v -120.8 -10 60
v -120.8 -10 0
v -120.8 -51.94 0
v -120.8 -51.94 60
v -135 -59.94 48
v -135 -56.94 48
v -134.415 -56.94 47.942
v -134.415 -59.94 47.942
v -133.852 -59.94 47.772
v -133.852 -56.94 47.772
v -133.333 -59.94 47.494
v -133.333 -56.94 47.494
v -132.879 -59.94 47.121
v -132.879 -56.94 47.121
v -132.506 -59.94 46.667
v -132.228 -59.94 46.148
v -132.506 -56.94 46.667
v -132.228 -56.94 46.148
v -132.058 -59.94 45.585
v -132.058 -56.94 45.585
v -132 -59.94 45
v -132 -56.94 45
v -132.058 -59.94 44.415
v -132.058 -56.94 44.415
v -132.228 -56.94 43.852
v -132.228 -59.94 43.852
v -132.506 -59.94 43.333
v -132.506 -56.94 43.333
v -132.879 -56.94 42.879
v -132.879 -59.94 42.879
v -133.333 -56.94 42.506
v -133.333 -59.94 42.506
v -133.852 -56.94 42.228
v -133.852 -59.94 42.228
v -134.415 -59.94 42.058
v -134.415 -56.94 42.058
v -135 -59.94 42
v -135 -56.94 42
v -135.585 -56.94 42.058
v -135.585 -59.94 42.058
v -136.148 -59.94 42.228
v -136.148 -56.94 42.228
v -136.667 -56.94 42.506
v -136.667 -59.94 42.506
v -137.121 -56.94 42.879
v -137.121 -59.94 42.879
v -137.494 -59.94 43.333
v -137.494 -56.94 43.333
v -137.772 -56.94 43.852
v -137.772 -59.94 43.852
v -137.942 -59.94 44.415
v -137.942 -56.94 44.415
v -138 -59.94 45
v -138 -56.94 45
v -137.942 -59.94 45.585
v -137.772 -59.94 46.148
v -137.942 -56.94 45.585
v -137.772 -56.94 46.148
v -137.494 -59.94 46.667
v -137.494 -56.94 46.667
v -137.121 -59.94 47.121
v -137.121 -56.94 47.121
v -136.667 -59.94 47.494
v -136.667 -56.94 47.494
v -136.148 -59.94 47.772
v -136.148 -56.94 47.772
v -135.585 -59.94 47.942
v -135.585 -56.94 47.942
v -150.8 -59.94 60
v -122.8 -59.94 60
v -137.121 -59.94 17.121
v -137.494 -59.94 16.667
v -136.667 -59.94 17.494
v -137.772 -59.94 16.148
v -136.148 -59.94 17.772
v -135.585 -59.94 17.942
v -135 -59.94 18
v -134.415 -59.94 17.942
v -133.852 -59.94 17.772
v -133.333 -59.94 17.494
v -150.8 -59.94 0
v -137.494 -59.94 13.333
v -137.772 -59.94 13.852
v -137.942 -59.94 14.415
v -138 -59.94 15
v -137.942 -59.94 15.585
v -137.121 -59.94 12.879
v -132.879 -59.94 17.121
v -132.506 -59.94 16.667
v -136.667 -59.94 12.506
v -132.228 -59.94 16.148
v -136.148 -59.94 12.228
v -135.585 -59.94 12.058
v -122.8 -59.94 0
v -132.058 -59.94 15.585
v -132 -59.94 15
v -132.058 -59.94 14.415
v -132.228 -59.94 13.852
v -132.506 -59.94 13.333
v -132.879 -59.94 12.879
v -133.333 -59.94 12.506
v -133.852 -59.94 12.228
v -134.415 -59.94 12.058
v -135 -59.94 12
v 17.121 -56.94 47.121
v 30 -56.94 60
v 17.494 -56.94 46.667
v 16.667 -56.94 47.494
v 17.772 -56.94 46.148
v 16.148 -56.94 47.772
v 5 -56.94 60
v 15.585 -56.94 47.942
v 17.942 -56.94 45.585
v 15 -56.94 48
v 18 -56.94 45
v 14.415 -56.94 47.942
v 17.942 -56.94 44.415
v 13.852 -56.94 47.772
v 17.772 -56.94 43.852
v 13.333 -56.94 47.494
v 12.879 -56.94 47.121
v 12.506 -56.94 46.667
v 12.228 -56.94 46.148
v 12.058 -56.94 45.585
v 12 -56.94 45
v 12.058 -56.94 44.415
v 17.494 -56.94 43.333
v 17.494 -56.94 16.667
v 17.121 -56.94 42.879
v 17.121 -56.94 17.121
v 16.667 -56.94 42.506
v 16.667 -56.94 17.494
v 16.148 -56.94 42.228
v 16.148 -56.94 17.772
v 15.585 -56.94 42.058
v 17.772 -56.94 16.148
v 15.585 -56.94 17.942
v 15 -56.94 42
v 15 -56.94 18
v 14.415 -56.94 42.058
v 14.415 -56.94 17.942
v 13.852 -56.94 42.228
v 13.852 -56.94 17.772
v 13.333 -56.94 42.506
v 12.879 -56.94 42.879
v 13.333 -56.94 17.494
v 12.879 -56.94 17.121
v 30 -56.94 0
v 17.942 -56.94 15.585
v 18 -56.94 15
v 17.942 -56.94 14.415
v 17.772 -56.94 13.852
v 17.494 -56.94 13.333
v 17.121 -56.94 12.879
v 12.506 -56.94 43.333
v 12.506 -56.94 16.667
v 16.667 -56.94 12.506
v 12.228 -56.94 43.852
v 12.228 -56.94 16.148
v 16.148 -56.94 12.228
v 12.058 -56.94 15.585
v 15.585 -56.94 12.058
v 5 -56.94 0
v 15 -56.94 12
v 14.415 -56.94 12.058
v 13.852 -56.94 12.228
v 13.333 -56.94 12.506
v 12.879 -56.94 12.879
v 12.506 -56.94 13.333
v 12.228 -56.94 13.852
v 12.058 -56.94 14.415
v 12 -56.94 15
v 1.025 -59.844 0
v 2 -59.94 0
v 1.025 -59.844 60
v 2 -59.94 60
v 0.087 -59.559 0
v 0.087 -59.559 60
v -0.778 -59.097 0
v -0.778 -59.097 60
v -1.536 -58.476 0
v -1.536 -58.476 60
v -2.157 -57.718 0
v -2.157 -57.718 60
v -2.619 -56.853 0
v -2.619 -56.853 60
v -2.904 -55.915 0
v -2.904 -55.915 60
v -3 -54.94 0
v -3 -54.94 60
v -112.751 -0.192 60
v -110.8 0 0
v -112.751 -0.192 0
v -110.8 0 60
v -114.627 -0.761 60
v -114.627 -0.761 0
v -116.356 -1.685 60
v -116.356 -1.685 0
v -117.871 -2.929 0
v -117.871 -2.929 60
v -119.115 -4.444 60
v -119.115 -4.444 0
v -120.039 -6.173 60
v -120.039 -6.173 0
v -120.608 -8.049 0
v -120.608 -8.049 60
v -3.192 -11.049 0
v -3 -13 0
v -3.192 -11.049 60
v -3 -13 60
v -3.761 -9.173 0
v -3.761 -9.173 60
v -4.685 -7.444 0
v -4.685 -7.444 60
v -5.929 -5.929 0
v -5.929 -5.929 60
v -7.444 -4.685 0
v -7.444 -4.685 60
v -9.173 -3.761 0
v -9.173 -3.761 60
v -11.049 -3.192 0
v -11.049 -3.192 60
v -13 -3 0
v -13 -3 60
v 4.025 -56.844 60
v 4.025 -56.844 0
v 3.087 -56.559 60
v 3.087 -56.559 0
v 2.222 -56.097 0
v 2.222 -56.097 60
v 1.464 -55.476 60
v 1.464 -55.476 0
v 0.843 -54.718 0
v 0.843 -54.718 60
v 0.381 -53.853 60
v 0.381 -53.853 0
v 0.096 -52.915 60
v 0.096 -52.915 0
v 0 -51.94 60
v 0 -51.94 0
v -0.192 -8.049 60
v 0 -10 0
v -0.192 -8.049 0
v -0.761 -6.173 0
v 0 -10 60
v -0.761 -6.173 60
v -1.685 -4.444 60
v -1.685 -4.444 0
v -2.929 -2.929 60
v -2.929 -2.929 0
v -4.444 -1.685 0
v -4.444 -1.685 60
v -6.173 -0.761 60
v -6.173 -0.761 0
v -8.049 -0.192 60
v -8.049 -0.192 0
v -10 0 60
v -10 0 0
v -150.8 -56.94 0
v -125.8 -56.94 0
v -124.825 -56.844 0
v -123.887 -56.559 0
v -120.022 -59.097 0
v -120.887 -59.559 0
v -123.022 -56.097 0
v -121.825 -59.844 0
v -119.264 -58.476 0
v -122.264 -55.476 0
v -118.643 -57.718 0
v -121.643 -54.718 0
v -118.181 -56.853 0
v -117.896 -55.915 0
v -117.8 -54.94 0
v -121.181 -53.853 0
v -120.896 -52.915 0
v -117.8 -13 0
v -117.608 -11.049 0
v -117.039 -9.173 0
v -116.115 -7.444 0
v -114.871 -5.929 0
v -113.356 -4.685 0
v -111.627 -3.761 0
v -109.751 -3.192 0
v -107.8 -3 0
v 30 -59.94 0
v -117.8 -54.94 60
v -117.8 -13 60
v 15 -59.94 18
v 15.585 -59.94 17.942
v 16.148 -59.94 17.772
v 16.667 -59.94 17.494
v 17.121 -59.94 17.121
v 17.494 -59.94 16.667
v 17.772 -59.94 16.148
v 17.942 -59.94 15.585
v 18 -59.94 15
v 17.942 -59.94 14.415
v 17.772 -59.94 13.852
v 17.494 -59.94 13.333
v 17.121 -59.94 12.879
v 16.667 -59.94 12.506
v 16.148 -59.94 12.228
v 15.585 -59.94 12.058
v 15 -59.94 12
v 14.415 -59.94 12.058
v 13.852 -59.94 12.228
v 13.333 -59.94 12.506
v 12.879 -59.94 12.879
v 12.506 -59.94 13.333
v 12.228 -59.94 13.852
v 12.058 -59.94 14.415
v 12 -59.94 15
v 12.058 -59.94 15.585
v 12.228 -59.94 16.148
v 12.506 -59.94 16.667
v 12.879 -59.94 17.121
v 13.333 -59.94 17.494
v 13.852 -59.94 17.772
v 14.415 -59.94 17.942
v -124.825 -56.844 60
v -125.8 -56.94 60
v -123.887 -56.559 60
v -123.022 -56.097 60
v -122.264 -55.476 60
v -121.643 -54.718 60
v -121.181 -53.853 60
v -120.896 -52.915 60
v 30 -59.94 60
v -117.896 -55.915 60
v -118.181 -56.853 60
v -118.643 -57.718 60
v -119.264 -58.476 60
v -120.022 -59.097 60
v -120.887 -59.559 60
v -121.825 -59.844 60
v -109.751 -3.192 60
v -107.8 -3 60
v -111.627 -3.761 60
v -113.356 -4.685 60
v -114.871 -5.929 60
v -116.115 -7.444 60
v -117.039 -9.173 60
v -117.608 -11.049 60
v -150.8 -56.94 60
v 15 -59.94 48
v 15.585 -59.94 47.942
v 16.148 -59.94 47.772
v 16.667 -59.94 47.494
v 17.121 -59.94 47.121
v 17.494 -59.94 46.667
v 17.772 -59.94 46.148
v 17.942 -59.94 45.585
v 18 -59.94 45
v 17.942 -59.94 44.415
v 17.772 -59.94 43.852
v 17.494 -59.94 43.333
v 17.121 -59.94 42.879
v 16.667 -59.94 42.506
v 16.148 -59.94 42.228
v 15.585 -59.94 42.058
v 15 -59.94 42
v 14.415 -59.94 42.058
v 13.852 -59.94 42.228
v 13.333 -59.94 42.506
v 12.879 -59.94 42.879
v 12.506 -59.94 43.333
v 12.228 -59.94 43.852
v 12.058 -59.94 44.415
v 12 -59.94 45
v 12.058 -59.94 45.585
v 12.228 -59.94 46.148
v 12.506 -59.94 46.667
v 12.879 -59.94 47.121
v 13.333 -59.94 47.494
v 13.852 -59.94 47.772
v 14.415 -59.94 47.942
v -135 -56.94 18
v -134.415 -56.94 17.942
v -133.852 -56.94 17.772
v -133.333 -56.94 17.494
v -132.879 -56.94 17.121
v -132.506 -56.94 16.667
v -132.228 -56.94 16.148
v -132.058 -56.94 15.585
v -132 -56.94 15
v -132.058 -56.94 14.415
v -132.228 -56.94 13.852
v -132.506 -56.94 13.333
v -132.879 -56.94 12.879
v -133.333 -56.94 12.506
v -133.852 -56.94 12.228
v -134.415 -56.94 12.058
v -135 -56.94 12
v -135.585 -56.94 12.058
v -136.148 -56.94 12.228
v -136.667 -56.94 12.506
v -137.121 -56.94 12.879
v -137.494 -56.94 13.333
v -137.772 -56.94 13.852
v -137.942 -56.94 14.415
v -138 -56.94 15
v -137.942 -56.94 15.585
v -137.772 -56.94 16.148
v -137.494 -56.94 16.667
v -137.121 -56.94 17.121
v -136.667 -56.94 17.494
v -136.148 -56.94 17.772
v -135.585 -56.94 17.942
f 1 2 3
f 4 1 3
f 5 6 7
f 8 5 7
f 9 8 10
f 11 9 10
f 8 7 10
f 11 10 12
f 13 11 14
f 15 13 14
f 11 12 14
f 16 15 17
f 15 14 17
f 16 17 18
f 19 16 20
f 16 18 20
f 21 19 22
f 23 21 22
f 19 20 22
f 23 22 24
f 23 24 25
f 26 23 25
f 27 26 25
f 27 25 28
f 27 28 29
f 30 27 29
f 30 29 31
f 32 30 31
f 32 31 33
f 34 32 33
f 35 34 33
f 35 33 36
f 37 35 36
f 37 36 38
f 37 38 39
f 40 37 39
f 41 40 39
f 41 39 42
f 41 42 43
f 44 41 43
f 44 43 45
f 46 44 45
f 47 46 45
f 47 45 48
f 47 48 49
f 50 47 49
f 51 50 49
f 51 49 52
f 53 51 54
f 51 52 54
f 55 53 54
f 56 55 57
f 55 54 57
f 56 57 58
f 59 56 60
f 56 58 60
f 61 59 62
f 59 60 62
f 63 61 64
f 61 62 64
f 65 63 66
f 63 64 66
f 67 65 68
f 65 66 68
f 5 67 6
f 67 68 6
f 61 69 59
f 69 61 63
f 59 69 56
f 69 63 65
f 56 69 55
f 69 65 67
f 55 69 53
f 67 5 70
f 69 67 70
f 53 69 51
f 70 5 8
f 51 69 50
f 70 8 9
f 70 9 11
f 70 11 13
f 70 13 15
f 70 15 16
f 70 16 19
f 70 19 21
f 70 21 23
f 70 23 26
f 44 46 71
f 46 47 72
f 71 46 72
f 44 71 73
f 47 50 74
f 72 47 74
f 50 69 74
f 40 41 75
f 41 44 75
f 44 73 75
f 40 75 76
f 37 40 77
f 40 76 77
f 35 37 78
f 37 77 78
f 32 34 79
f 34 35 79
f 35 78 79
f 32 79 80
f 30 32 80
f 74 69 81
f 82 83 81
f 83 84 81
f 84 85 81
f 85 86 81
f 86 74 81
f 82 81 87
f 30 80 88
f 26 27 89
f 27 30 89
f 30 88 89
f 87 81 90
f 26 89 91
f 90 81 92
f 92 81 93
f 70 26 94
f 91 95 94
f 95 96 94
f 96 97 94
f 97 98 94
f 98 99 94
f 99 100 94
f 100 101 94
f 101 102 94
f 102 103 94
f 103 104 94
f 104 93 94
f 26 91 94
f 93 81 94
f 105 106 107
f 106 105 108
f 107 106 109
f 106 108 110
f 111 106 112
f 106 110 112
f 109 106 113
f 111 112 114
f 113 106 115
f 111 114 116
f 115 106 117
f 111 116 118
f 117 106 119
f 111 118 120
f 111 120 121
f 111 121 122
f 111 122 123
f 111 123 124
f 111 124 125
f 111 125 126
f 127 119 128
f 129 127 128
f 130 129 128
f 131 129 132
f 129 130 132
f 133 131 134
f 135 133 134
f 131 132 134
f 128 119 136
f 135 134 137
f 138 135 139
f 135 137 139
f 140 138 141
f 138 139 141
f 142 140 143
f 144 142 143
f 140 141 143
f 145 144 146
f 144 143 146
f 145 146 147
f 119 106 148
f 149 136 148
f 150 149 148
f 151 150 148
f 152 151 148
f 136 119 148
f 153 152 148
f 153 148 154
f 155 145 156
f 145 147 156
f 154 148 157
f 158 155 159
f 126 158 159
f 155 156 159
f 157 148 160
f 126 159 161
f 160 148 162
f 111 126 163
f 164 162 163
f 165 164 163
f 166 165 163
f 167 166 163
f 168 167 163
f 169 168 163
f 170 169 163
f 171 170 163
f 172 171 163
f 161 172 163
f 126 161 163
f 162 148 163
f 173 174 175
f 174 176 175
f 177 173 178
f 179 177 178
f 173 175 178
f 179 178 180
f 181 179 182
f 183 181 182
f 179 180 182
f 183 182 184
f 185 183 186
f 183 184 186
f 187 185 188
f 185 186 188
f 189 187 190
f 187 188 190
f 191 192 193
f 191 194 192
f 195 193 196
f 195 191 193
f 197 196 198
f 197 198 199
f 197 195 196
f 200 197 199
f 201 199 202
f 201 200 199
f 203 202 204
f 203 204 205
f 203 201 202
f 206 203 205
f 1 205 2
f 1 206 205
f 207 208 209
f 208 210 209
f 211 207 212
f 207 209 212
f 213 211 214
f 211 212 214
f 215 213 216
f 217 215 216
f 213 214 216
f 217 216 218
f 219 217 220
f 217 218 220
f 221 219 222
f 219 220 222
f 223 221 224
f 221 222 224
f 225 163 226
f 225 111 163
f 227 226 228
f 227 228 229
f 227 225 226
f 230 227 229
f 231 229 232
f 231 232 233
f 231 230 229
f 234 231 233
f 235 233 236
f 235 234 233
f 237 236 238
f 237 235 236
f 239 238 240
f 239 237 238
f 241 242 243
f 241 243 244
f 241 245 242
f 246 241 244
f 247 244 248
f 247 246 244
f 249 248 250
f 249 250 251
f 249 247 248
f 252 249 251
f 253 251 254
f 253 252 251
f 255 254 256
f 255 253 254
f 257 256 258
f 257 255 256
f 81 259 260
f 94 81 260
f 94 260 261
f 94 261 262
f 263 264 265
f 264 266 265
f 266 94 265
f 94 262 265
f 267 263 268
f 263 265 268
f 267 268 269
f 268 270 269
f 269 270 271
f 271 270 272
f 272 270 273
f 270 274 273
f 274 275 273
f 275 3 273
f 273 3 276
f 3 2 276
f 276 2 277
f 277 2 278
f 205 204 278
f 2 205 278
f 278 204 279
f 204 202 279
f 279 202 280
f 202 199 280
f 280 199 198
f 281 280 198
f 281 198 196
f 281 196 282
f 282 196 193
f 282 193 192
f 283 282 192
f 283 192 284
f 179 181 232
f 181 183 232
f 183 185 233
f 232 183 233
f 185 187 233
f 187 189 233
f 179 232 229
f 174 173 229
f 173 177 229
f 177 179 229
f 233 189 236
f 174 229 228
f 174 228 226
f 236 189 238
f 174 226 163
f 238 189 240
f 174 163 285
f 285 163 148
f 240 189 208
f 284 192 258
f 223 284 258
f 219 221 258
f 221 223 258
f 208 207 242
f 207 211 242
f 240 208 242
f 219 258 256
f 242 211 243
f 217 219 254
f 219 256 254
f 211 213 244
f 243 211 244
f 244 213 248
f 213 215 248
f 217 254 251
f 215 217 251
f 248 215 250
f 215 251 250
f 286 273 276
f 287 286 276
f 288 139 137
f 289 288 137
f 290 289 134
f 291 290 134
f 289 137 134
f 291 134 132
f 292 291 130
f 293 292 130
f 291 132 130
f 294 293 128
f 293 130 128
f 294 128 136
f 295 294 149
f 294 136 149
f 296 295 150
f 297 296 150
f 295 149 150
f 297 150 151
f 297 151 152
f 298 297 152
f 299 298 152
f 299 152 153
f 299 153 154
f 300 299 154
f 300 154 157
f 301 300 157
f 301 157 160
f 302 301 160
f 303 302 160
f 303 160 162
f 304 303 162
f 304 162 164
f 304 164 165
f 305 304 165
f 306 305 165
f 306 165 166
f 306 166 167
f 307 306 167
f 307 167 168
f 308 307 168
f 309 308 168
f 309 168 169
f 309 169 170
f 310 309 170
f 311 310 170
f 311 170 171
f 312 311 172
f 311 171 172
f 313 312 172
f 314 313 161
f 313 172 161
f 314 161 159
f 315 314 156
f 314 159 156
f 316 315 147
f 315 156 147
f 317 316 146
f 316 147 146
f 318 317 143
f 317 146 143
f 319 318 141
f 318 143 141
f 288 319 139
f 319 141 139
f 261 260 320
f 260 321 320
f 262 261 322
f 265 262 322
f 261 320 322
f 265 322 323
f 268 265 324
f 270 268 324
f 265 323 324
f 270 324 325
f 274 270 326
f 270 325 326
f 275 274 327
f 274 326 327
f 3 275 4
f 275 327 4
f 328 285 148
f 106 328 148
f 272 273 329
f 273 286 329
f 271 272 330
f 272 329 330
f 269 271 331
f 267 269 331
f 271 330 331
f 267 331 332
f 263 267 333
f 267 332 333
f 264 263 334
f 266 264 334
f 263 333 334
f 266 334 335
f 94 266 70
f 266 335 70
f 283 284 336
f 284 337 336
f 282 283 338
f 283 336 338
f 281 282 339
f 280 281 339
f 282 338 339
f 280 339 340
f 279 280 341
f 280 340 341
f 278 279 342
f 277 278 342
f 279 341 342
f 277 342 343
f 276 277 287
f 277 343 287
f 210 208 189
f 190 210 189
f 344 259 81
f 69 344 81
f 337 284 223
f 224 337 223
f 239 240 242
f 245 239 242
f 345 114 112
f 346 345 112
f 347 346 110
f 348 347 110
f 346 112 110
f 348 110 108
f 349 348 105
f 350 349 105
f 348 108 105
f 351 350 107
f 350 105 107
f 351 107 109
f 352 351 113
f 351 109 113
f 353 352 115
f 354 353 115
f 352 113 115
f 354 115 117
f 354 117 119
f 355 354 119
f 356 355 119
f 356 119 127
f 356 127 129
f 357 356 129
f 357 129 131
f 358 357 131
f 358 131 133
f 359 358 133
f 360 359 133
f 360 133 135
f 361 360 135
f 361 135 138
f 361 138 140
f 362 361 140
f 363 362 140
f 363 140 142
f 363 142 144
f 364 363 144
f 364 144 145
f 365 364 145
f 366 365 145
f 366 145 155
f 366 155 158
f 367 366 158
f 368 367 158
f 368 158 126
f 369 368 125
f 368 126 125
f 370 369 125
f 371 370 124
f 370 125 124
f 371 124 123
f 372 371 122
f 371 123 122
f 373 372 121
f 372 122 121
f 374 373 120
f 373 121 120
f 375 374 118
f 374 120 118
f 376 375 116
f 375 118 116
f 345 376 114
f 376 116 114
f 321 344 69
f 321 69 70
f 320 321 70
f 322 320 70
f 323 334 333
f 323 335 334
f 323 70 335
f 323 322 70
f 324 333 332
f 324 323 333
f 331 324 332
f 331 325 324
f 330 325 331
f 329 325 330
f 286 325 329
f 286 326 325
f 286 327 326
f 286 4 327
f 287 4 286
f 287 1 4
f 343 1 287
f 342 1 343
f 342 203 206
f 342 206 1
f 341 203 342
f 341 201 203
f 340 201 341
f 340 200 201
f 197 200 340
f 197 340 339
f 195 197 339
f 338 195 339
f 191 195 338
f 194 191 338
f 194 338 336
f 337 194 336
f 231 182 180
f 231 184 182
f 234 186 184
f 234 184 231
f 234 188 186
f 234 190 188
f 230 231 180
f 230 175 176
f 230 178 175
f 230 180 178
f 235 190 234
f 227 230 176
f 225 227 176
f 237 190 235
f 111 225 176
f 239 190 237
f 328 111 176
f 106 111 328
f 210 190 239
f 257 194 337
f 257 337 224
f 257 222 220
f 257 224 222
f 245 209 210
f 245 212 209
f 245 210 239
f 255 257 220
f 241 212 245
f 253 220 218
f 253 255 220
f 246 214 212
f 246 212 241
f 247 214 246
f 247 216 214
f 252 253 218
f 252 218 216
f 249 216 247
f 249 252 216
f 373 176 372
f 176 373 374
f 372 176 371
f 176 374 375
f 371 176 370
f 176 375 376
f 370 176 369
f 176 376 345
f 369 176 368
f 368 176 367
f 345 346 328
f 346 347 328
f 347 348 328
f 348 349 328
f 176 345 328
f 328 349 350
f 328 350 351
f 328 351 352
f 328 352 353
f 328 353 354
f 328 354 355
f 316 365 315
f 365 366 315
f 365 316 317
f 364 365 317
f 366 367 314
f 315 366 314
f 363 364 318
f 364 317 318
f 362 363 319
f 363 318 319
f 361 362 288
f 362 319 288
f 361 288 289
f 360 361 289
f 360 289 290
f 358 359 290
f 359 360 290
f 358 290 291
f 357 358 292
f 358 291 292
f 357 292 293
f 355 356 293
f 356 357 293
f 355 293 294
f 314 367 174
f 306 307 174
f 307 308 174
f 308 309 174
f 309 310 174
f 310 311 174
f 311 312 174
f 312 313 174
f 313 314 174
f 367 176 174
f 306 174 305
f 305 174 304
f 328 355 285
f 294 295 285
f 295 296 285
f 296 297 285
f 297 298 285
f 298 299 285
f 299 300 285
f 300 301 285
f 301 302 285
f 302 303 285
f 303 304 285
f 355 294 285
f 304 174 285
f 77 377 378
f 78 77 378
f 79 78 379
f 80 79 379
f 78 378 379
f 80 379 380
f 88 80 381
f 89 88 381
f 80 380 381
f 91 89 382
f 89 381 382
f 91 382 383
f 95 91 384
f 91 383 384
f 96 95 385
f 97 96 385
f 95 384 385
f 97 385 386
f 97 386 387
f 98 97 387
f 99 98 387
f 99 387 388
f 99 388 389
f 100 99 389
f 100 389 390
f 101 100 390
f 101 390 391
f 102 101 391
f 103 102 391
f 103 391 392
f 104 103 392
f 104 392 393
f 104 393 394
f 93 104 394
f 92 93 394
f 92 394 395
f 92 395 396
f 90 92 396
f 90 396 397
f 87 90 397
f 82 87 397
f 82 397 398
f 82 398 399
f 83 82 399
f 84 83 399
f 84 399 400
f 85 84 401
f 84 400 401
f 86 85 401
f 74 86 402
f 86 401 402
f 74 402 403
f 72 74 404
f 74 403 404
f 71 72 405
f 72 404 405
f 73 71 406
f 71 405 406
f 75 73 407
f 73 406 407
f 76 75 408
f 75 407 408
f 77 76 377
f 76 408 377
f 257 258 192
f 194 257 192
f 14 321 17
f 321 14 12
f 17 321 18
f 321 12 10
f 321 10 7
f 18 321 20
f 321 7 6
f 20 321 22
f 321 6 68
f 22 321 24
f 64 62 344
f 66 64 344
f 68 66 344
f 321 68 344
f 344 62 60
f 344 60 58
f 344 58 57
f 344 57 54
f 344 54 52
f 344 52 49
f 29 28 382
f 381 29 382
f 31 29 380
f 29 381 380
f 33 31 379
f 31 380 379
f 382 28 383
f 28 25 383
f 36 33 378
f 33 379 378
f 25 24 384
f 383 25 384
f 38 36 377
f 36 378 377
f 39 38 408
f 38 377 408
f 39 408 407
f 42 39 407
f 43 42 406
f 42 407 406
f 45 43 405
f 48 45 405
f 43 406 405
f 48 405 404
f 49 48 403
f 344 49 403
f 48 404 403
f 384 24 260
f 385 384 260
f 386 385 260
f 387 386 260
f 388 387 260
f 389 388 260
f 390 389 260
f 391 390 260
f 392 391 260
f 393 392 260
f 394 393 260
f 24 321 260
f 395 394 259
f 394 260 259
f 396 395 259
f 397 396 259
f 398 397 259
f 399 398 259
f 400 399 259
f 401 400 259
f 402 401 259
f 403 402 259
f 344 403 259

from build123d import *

# Parameters (mm, degrees)
EXTRUDE_THIN1_DEPTH       = 60
SKETCH2_R                 = 3
CUT_EXTRUDE1_DEPTH        = 10
LPATTERN1_COUNT           = 2
LPATTERN1_PITCH           = 30
LPATTERN2_COUNT           = 2
LPATTERN2_PITCH           = 150
LPATTERN2_COPY_1_SKETCH_R = 3
LPATTERN2_COPY_1_DEPTH    = 10
FILLET1_R                 = 10
FILLET2_R                 = 10
FILLET3_R                 = 5
FILLET4_R                 = 5


with BuildPart() as part:
    # Sketch1 → Extrude-Thin1 (new body)
    with BuildSketch(Plane.XY):
        Polygon((30, -56.94), (0, -56.94), (0, 0), (-120.8, 0), (-120.8, -56.94), (-150.8, -56.94), (-150.8, -59.94), (-117.8, -59.94), (-117.8, -3), (-3, -3), (-3, -59.94), (30, -59.94), align=None)
    extrude(amount=EXTRUDE_THIN1_DEPTH)

    # Sketch2 → Cut-Extrude1 (cut)
    with BuildSketch(Plane(origin=(0, -56.94, 0), x_dir=(1, 0, 0), z_dir=(0, 1, 0))):
        with Locations(Location((15, -15, 0), (0, 0, 270))):
            Circle(SKETCH2_R)
    cut_extrude1 = extrude(amount=-CUT_EXTRUDE1_DEPTH, mode=Mode.SUBTRACT)

    # LPattern1: Cut-Extrude1 ×2
    with Locations(*[(0, 0, i * LPATTERN1_PITCH) for i in range(1, LPATTERN1_COUNT)]):
        add(cut_extrude1, mode=Mode.SUBTRACT)

    # LPattern2: Cut-Extrude1 ×2
    with Locations(*[(-i * LPATTERN2_PITCH, 0, 0) for i in range(1, LPATTERN2_COUNT)]):
        add(cut_extrude1, mode=Mode.SUBTRACT)

    # LPattern2 copy 1 sketch → LPattern2 copy 1 (cut)
    with BuildSketch(Plane(origin=(-150, -56.94, 30), x_dir=(1, 0, 0), z_dir=(0, 1, 0))):
        with Locations(Location((15, -15, 0), (0, 0, 270))):
            Circle(LPATTERN2_COPY_1_SKETCH_R)
    extrude(amount=-LPATTERN2_COPY_1_DEPTH, mode=Mode.SUBTRACT)

    # Fillet1
    fillet1_edges = [part.edges().sort_by_distance(p)[0] for p in [
        (-120.8, 0, 30),
        (0, 0, 30),
    ]]
    fillet(fillet1_edges, radius=FILLET1_R)

    # Fillet2
    fillet2_edges = [part.edges().sort_by_distance(p)[0] for p in [
        (-3, -3, 30),
        (-117.8, -3, 30),
    ]]
    fillet(fillet2_edges, radius=FILLET2_R)

    # Fillet3
    fillet3_edges = [part.edges().sort_by_distance(p)[0] for p in [
        (-120.8, -56.94, 30),
        (0, -56.94, 30),
    ]]
    fillet(fillet3_edges, radius=FILLET3_R)

    # Fillet4
    fillet4_edges = [part.edges().sort_by_distance(p)[0] for p in [
        (-3, -59.94, 30),
        (-117.8, -59.94, 30),
    ]]
    fillet(fillet4_edges, radius=FILLET4_R)


solid = part.part
